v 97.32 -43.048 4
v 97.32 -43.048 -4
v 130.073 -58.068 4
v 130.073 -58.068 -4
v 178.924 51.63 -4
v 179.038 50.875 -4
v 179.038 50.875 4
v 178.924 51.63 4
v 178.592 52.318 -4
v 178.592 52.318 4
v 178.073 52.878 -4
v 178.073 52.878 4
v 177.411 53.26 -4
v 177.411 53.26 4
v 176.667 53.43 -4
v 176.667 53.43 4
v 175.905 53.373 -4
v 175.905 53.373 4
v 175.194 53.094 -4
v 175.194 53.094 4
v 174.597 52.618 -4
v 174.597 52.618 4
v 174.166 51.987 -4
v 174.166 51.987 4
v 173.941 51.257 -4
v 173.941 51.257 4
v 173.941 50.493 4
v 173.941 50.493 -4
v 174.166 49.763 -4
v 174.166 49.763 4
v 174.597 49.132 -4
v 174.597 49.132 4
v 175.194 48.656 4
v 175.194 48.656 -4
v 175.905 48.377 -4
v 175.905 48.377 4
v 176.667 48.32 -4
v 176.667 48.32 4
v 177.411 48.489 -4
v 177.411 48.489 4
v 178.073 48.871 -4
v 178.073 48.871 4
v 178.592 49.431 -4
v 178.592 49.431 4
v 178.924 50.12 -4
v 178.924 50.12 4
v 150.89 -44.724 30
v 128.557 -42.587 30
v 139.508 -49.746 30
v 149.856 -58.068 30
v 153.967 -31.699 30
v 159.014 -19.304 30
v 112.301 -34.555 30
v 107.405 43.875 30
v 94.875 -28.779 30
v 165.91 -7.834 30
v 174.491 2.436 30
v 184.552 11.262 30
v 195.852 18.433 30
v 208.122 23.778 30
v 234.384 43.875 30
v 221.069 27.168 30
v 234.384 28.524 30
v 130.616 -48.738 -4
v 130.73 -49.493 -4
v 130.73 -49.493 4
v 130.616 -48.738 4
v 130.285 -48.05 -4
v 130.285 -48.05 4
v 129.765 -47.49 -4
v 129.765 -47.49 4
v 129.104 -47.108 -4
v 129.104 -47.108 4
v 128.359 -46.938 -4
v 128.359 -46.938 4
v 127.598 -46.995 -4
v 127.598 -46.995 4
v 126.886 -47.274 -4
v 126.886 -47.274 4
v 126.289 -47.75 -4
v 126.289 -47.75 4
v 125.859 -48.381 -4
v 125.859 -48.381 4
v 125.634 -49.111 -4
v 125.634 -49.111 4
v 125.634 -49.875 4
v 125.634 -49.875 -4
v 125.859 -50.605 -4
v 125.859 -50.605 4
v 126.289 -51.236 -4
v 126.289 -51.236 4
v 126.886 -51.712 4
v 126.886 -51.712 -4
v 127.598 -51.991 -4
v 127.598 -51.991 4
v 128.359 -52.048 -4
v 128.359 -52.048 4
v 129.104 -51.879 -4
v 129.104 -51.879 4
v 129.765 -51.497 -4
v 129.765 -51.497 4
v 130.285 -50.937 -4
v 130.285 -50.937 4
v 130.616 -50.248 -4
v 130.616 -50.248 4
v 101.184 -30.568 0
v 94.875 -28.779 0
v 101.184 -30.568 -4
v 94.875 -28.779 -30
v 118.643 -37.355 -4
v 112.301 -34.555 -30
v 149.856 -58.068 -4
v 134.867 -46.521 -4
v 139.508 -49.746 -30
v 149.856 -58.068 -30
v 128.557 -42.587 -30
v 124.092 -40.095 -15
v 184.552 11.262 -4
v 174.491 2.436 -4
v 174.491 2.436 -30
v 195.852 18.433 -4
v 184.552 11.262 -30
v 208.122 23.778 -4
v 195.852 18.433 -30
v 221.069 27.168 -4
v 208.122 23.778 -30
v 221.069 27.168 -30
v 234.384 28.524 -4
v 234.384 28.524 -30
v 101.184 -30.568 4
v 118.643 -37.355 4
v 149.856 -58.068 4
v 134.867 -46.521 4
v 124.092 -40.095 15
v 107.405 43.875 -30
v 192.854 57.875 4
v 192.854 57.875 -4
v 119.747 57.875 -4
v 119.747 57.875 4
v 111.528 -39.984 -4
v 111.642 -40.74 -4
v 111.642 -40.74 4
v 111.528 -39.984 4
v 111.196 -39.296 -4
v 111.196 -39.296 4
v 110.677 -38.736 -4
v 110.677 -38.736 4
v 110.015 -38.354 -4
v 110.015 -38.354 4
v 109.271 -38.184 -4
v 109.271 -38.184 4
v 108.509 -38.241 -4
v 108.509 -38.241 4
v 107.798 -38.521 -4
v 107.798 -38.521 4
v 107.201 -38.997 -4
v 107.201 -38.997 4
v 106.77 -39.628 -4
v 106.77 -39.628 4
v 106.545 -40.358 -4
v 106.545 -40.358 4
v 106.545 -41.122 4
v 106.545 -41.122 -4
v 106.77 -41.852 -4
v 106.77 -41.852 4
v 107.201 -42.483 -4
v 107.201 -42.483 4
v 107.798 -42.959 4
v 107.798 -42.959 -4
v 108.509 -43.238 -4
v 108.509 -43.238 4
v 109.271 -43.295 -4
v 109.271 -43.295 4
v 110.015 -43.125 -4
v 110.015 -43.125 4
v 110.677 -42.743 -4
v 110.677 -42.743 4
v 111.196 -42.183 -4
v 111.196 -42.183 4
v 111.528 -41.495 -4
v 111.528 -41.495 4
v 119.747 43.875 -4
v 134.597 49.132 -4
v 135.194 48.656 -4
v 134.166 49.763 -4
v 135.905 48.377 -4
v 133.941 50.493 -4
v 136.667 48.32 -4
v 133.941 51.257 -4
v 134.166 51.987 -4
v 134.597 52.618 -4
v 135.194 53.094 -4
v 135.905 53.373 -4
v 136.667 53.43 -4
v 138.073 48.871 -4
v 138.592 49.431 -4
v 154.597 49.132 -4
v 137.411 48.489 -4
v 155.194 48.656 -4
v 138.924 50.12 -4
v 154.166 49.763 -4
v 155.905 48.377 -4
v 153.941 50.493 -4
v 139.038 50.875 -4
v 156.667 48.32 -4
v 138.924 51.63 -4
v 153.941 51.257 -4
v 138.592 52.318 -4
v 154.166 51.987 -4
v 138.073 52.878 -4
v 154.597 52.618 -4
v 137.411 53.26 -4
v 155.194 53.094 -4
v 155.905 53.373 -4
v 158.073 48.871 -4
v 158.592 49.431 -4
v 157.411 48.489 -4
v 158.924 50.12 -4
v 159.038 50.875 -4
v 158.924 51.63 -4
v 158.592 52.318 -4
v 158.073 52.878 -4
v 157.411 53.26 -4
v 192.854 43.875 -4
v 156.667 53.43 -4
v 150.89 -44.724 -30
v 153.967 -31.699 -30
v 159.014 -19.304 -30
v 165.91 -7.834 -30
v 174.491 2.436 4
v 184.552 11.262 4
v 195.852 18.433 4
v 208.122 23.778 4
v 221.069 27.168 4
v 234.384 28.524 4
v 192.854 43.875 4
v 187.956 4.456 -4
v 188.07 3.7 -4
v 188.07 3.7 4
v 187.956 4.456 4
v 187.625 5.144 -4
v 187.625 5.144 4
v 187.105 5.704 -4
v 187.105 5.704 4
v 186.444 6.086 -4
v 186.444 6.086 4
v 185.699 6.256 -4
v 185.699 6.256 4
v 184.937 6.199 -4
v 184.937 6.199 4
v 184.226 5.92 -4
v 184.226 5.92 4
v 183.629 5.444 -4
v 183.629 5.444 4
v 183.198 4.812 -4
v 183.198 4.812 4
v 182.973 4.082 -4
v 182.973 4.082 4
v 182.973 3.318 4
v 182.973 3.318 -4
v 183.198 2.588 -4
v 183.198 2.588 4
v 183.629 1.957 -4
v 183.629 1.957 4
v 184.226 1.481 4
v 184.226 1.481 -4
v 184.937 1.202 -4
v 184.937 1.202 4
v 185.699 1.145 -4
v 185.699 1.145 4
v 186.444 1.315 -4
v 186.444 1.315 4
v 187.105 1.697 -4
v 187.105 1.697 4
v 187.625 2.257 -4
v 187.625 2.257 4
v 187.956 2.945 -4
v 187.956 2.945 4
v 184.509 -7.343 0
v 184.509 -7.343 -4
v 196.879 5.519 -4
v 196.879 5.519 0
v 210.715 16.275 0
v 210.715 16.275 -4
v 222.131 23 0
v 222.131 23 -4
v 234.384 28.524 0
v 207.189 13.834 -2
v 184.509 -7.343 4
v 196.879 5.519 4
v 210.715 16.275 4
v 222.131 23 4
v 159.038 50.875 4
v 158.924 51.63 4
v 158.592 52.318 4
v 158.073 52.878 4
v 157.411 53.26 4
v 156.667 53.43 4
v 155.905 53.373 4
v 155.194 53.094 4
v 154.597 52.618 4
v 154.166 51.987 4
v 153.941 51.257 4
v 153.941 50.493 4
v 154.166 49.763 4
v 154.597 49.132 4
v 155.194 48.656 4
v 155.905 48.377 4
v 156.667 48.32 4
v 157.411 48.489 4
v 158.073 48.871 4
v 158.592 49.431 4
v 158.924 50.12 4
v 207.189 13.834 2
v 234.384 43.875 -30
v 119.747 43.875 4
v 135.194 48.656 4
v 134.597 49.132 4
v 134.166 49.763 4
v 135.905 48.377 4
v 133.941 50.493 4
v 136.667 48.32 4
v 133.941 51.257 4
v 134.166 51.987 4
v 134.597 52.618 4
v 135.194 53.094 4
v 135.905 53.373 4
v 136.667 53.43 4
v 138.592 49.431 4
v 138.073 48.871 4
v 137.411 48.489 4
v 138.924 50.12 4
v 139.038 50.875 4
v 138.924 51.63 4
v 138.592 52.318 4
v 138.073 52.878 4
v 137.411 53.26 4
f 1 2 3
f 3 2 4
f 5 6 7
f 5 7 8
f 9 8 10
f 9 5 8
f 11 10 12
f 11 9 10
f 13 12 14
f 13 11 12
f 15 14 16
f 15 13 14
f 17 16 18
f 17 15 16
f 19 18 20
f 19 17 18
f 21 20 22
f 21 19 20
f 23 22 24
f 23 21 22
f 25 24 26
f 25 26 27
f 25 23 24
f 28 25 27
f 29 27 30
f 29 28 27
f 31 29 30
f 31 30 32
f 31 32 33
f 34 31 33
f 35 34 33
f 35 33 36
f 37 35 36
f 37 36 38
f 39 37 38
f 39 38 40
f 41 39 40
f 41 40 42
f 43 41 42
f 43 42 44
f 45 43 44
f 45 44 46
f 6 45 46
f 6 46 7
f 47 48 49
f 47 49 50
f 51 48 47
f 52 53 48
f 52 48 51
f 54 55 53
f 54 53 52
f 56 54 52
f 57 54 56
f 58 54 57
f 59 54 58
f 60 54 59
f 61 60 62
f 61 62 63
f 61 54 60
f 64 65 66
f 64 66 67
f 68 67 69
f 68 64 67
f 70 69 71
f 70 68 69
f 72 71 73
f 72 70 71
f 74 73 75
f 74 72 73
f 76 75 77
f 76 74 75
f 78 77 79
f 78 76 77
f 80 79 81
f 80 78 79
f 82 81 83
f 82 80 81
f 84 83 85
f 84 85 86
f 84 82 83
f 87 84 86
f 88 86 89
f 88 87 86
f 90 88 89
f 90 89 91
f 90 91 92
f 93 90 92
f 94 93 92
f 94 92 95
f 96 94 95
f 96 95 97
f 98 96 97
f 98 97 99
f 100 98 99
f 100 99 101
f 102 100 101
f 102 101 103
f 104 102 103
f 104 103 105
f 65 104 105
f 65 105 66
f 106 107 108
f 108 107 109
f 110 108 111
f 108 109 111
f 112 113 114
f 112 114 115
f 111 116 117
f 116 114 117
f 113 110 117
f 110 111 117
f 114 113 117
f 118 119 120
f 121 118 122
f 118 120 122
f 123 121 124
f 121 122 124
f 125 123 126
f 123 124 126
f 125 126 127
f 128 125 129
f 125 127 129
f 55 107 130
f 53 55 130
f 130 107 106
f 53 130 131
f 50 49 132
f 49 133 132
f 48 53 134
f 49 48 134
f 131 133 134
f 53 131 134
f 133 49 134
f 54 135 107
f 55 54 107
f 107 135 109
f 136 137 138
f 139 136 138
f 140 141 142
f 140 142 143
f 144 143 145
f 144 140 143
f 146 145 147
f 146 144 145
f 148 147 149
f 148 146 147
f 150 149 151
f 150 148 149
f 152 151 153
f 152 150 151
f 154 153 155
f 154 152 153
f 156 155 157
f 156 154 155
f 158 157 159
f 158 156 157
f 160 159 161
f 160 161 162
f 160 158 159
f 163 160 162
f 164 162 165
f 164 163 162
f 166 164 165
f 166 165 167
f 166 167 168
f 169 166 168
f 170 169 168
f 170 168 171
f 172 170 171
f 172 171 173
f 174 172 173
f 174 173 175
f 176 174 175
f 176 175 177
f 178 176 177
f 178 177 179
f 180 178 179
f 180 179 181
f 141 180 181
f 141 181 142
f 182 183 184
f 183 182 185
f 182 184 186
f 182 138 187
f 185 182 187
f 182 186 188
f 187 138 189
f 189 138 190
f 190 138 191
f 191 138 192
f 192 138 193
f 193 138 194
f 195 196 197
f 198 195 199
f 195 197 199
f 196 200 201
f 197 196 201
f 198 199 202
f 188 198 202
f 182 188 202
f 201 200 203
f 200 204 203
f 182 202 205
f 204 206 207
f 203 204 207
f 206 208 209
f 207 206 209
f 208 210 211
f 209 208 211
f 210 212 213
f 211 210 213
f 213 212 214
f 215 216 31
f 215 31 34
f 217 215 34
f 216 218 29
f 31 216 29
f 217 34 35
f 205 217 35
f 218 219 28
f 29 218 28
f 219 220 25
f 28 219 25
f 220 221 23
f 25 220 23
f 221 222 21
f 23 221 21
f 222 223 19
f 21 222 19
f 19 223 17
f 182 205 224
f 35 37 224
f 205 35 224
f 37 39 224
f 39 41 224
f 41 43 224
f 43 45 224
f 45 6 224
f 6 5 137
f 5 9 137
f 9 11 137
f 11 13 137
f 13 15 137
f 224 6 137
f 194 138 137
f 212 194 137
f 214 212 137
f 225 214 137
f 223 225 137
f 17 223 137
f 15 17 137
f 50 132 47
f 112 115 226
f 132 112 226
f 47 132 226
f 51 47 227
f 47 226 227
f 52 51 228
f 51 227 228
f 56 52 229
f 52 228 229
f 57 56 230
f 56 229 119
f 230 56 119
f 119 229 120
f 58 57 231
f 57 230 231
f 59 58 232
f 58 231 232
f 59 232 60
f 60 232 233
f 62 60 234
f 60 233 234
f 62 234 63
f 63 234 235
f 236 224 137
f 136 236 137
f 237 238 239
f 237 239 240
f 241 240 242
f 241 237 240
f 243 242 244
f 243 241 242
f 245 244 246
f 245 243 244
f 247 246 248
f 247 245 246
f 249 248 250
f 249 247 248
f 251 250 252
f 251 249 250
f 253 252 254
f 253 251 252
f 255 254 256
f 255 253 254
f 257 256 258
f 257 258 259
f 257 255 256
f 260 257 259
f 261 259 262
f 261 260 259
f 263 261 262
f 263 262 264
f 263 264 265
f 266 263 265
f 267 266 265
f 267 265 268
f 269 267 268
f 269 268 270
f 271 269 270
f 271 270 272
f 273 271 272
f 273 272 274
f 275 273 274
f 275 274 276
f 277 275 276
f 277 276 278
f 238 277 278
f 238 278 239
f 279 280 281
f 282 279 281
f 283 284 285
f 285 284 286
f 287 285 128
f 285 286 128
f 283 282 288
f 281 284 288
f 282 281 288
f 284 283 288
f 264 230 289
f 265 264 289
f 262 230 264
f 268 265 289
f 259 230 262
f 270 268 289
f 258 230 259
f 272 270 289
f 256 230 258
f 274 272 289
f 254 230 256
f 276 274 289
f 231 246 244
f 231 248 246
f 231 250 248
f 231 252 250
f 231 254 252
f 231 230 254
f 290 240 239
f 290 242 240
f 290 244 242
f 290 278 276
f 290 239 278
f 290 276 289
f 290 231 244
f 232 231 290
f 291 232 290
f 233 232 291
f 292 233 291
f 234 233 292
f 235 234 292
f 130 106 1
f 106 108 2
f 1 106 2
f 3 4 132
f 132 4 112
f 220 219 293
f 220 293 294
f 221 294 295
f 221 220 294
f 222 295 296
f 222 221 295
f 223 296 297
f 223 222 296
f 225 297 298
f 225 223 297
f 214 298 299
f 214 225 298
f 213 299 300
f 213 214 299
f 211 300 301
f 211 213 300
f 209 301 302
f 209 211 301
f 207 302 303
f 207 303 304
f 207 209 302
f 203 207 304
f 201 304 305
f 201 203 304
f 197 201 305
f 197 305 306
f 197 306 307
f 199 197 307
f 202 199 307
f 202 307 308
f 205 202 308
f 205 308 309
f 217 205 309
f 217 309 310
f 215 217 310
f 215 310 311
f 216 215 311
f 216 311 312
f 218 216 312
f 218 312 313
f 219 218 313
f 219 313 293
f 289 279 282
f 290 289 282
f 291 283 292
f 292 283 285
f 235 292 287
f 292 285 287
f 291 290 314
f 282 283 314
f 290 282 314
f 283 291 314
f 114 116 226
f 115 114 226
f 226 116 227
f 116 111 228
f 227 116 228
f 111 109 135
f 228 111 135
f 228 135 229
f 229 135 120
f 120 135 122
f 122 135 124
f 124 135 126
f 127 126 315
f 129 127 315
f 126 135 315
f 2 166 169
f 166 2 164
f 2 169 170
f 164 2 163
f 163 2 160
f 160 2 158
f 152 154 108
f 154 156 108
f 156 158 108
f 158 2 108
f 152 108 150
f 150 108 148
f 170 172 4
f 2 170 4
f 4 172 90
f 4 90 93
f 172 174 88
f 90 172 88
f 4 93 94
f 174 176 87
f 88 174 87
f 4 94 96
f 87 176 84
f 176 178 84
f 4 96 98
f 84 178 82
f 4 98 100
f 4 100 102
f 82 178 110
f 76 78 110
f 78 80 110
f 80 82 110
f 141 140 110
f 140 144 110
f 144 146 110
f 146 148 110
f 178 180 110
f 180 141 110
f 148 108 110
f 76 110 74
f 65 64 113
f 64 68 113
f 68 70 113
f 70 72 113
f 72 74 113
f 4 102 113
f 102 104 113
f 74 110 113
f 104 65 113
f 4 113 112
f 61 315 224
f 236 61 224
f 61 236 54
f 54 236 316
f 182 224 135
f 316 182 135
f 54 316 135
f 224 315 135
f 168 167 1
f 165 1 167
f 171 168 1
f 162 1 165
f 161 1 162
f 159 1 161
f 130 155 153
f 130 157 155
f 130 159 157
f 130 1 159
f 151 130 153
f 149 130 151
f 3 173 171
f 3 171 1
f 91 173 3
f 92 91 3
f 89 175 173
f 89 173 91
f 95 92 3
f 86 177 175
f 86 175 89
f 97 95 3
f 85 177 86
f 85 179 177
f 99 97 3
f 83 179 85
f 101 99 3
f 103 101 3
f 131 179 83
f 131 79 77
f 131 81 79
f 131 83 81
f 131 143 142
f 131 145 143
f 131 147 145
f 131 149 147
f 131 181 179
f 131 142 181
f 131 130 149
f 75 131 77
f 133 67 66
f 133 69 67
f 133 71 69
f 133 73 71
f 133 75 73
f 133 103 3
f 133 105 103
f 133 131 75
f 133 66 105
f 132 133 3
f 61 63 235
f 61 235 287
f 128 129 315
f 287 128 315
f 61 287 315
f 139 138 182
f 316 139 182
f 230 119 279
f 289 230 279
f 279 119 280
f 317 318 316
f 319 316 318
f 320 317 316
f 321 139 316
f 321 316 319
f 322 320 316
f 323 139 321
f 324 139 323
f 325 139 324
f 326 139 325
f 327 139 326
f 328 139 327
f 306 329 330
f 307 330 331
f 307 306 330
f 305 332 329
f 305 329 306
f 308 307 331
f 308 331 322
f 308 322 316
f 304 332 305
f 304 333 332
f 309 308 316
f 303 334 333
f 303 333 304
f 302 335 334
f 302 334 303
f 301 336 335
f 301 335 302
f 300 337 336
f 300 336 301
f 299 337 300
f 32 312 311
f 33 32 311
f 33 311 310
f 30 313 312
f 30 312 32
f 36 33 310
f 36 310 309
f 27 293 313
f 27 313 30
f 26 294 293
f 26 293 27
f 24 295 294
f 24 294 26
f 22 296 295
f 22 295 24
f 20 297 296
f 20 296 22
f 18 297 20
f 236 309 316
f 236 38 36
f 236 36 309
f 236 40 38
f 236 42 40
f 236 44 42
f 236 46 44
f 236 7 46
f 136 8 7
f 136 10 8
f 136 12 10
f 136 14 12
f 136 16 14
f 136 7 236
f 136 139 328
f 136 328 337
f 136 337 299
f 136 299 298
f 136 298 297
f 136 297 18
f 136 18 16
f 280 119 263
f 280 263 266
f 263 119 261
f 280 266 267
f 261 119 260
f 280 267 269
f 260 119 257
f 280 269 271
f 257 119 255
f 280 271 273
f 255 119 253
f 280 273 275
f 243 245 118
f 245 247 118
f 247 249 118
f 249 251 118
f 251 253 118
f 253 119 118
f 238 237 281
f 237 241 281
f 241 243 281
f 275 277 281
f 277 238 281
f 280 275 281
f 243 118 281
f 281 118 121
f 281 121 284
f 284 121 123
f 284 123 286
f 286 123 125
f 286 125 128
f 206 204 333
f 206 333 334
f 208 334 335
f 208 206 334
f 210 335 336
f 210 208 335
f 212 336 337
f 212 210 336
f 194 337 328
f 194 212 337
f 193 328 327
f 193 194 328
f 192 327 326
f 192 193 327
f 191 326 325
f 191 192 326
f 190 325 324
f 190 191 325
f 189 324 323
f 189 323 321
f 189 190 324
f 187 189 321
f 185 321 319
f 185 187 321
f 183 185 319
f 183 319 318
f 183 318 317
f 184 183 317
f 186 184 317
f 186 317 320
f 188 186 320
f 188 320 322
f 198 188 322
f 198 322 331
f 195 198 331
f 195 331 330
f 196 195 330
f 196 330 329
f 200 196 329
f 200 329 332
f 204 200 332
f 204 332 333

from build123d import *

# Parameters (mm, degrees)
RIGHT_MAIN_DEPTH    = 30
SKETCH2_R           = 2.5625
SKETCH2_R_2         = 2.563
RIGHTSCREWS_DEPTH   = 4
LEFT_MAIN_START     = -30
LEFT_MAIN_DEPTH     = 30
BOSS_EXTRUDE4_START = -4
LEFTSCRWS_R         = 2.5625
LEFTSCRWS_R_2       = 2.563
BOSS_EXTRUDE4_DEPTH = 4


with BuildPart() as part:
    # Sketch1 → right_main (new body)
    with BuildSketch(Plane.XY):
        with BuildLine():
            Line((107.405043491, 43.874842), (94.874715104, -28.778692489))
            add(Edge.make_bspline(
                [(94.874715104, -28.778692489), (125.81929731, -36.765852729), (149.855864514, -58.067716007)],
                knots=[0, 0, 0, 1, 1, 1], degree=2))
            Line((149.855864514, -58.067716007), (149.855864514, 43.874842))
            Line((149.855864514, 43.874842), (107.405043491, 43.874842))
        make_face()
        Polygon((149.855864514, 43.874842), (149.855864514, 28.52351163), (234.383754043, 28.52351163), (234.383754043, 43.874842), (192.853964769, 43.874842), align=None)
        with BuildLine():
            Line((149.855864514, 28.52351163), (149.855864514, -58.067716007))
            ThreePointArc((149.855864514, -58.067716007), (156.250771623, -25.404082318), (174.491218383, 2.436426025))
            ThreePointArc((174.491218383, 2.436426025), (201.883813055, 21.342868309), (234.383754043, 28.52351163))
            Line((234.383754043, 28.52351163), (149.855864514, 28.52351163))
        make_face()
    extrude(amount=RIGHT_MAIN_DEPTH)

    # Sketch2 → rightScrews (add)
    # profile 1 of 3: a face of its own
    with BuildSketch(Plane.XY):
        Polygon((119.747446117, 43.874842), (149.855864514, 43.874842), (192.853964769, 43.874842), (192.853964769, 57.874842), (119.747446117, 57.874842), align=None)
        with Locations((136.47520886, 50.874842)):
            Circle(SKETCH2_R, mode=Mode.SUBTRACT)
        with Locations((156.47520886, 50.874842)):
            Circle(SKETCH2_R, mode=Mode.SUBTRACT)
        with Locations((176.47520886, 50.874842)):
            Circle(SKETCH2_R, mode=Mode.SUBTRACT)
    # profile 2 of 3: a face of its own
    with BuildSketch(Plane.XY):
        with BuildLine():
            ThreePointArc((234.383754043, 28.52351163), (201.883813055, 21.342868309), (174.491218383, 2.436426025))
            Line((174.491218383, 2.436426025), (184.509352234, -7.342990836))
            add(Edge.make_bspline(
                [(184.509352234, -7.342990836), (204.930565052, 17.078226951), (234.383754043, 28.52351163)],
                knots=[0, 0, 0, 1, 1, 1], degree=2))
        make_face()
        with Locations((185.50732181, 3.700386733)):
            Circle(SKETCH2_R_2, mode=Mode.SUBTRACT)
    # profile 3 of 3: a face of its own
    with BuildSketch(Plane.XY):
        with BuildLine():
            Line((130.072927577, -58.067716007), (149.855864514, -58.067716007))
            add(Edge.make_bspline(
                [(101.184495321, -30.567929509), (128.298436124, -38.962933352), (149.855864514, -58.067716007)],
                knots=[0.103140303, 0.103140303, 0.103140303, 1, 1, 1], degree=2))
            Line((101.184495321, -30.567929509), (97.320282555, -43.048452225))
            Line((97.320282555, -43.048452225), (130.072927577, -58.067716007))
        make_face()
        with Locations((128.167744084, -49.493161828)):
            Circle(SKETCH2_R, mode=Mode.SUBTRACT)
        with Locations((109.079068542, -40.739735867)):
            Circle(SKETCH2_R, mode=Mode.SUBTRACT)
    extrude(amount=RIGHTSCREWS_DEPTH)

    # Sketch3 → left_main (add)
    with BuildSketch(Plane.XY.offset(LEFT_MAIN_START)):
        Polygon((149.855864514, 43.874842), (149.855864514, 28.52351163), (234.383754043, 28.52351163), (234.383754043, 43.874842), (192.853964769, 43.874842), align=None)
        with BuildLine():
            Line((107.405043491, 43.874842), (94.874715104, -28.778692489))
            add(Edge.make_bspline(
                [(94.874715104, -28.778692489), (125.81929731, -36.765852729), (149.855864514, -58.067716007)],
                knots=[0, 0, 0, 1, 1, 1], degree=2))
            Line((149.855864514, -58.067716007), (149.855864514, 43.874842))
            Line((149.855864514, 43.874842), (107.405043491, 43.874842))
        make_face()
        with BuildLine():
            Line((149.855864514, 28.52351163), (149.855864514, -58.067716007))
            ThreePointArc((149.855864514, -58.067716007), (156.250771623, -25.404082318), (174.491218383, 2.436426025))
            ThreePointArc((174.491218383, 2.436426025), (201.883813055, 21.342868309), (234.383754043, 28.52351163))
            Line((234.383754043, 28.52351163), (149.855864514, 28.52351163))
        make_face()
    extrude(amount=LEFT_MAIN_DEPTH)

    # leftScrws → Boss-Extrude4 (add)
    # profile 1 of 3: a face of its own
    with BuildSketch(Plane.XY.offset(BOSS_EXTRUDE4_START)):
        Polygon((119.747446117, 43.874842), (149.855864514, 43.874842), (192.853964769, 43.874842), (192.853964769, 57.874842), (119.747446117, 57.874842), align=None)
        with Locations((136.47520886, 50.874842)):
            Circle(LEFTSCRWS_R, mode=Mode.SUBTRACT)
        with Locations((156.47520886, 50.874842)):
            Circle(LEFTSCRWS_R, mode=Mode.SUBTRACT)
        with Locations((176.47520886, 50.874842)):
            Circle(LEFTSCRWS_R, mode=Mode.SUBTRACT)
    # profile 2 of 3: a face of its own
    with BuildSketch(Plane.XY.offset(BOSS_EXTRUDE4_START)):
        with BuildLine():
            Line((130.072927577, -58.067716007), (149.855864514, -58.067716007))
            add(Edge.make_bspline(
                [(101.184495321, -30.567929509), (128.298436124, -38.962933352), (149.855864514, -58.067716007)],
                knots=[0.103140303, 0.103140303, 0.103140303, 1, 1, 1], degree=2))
            Line((101.184495321, -30.567929509), (97.320282555, -43.048452225))
            Line((97.320282555, -43.048452225), (130.072927577, -58.067716007))
        make_face()
        with Locations((128.167744084, -49.493161828)):
            Circle(LEFTSCRWS_R, mode=Mode.SUBTRACT)
        with Locations((109.079068542, -40.739735867)):
            Circle(LEFTSCRWS_R, mode=Mode.SUBTRACT)
    # profile 3 of 3: a face of its own
    with BuildSketch(Plane.XY.offset(BOSS_EXTRUDE4_START)):
        with BuildLine():
            ThreePointArc((234.383754043, 28.52351163), (201.883813055, 21.342868309), (174.491218383, 2.436426025))
            Line((174.491218383, 2.436426025), (184.509352234, -7.342990836))
            add(Edge.make_bspline(
                [(184.509352234, -7.342990836), (204.930565052, 17.078226951), (234.383754043, 28.52351163)],
                knots=[0, 0, 0, 1, 1, 1], degree=2))
        make_face()
        with Locations((185.50732181, 3.700386733)):
            Circle(LEFTSCRWS_R_2, mode=Mode.SUBTRACT)
    extrude(amount=BOSS_EXTRUDE4_DEPTH)


solid = part.part
